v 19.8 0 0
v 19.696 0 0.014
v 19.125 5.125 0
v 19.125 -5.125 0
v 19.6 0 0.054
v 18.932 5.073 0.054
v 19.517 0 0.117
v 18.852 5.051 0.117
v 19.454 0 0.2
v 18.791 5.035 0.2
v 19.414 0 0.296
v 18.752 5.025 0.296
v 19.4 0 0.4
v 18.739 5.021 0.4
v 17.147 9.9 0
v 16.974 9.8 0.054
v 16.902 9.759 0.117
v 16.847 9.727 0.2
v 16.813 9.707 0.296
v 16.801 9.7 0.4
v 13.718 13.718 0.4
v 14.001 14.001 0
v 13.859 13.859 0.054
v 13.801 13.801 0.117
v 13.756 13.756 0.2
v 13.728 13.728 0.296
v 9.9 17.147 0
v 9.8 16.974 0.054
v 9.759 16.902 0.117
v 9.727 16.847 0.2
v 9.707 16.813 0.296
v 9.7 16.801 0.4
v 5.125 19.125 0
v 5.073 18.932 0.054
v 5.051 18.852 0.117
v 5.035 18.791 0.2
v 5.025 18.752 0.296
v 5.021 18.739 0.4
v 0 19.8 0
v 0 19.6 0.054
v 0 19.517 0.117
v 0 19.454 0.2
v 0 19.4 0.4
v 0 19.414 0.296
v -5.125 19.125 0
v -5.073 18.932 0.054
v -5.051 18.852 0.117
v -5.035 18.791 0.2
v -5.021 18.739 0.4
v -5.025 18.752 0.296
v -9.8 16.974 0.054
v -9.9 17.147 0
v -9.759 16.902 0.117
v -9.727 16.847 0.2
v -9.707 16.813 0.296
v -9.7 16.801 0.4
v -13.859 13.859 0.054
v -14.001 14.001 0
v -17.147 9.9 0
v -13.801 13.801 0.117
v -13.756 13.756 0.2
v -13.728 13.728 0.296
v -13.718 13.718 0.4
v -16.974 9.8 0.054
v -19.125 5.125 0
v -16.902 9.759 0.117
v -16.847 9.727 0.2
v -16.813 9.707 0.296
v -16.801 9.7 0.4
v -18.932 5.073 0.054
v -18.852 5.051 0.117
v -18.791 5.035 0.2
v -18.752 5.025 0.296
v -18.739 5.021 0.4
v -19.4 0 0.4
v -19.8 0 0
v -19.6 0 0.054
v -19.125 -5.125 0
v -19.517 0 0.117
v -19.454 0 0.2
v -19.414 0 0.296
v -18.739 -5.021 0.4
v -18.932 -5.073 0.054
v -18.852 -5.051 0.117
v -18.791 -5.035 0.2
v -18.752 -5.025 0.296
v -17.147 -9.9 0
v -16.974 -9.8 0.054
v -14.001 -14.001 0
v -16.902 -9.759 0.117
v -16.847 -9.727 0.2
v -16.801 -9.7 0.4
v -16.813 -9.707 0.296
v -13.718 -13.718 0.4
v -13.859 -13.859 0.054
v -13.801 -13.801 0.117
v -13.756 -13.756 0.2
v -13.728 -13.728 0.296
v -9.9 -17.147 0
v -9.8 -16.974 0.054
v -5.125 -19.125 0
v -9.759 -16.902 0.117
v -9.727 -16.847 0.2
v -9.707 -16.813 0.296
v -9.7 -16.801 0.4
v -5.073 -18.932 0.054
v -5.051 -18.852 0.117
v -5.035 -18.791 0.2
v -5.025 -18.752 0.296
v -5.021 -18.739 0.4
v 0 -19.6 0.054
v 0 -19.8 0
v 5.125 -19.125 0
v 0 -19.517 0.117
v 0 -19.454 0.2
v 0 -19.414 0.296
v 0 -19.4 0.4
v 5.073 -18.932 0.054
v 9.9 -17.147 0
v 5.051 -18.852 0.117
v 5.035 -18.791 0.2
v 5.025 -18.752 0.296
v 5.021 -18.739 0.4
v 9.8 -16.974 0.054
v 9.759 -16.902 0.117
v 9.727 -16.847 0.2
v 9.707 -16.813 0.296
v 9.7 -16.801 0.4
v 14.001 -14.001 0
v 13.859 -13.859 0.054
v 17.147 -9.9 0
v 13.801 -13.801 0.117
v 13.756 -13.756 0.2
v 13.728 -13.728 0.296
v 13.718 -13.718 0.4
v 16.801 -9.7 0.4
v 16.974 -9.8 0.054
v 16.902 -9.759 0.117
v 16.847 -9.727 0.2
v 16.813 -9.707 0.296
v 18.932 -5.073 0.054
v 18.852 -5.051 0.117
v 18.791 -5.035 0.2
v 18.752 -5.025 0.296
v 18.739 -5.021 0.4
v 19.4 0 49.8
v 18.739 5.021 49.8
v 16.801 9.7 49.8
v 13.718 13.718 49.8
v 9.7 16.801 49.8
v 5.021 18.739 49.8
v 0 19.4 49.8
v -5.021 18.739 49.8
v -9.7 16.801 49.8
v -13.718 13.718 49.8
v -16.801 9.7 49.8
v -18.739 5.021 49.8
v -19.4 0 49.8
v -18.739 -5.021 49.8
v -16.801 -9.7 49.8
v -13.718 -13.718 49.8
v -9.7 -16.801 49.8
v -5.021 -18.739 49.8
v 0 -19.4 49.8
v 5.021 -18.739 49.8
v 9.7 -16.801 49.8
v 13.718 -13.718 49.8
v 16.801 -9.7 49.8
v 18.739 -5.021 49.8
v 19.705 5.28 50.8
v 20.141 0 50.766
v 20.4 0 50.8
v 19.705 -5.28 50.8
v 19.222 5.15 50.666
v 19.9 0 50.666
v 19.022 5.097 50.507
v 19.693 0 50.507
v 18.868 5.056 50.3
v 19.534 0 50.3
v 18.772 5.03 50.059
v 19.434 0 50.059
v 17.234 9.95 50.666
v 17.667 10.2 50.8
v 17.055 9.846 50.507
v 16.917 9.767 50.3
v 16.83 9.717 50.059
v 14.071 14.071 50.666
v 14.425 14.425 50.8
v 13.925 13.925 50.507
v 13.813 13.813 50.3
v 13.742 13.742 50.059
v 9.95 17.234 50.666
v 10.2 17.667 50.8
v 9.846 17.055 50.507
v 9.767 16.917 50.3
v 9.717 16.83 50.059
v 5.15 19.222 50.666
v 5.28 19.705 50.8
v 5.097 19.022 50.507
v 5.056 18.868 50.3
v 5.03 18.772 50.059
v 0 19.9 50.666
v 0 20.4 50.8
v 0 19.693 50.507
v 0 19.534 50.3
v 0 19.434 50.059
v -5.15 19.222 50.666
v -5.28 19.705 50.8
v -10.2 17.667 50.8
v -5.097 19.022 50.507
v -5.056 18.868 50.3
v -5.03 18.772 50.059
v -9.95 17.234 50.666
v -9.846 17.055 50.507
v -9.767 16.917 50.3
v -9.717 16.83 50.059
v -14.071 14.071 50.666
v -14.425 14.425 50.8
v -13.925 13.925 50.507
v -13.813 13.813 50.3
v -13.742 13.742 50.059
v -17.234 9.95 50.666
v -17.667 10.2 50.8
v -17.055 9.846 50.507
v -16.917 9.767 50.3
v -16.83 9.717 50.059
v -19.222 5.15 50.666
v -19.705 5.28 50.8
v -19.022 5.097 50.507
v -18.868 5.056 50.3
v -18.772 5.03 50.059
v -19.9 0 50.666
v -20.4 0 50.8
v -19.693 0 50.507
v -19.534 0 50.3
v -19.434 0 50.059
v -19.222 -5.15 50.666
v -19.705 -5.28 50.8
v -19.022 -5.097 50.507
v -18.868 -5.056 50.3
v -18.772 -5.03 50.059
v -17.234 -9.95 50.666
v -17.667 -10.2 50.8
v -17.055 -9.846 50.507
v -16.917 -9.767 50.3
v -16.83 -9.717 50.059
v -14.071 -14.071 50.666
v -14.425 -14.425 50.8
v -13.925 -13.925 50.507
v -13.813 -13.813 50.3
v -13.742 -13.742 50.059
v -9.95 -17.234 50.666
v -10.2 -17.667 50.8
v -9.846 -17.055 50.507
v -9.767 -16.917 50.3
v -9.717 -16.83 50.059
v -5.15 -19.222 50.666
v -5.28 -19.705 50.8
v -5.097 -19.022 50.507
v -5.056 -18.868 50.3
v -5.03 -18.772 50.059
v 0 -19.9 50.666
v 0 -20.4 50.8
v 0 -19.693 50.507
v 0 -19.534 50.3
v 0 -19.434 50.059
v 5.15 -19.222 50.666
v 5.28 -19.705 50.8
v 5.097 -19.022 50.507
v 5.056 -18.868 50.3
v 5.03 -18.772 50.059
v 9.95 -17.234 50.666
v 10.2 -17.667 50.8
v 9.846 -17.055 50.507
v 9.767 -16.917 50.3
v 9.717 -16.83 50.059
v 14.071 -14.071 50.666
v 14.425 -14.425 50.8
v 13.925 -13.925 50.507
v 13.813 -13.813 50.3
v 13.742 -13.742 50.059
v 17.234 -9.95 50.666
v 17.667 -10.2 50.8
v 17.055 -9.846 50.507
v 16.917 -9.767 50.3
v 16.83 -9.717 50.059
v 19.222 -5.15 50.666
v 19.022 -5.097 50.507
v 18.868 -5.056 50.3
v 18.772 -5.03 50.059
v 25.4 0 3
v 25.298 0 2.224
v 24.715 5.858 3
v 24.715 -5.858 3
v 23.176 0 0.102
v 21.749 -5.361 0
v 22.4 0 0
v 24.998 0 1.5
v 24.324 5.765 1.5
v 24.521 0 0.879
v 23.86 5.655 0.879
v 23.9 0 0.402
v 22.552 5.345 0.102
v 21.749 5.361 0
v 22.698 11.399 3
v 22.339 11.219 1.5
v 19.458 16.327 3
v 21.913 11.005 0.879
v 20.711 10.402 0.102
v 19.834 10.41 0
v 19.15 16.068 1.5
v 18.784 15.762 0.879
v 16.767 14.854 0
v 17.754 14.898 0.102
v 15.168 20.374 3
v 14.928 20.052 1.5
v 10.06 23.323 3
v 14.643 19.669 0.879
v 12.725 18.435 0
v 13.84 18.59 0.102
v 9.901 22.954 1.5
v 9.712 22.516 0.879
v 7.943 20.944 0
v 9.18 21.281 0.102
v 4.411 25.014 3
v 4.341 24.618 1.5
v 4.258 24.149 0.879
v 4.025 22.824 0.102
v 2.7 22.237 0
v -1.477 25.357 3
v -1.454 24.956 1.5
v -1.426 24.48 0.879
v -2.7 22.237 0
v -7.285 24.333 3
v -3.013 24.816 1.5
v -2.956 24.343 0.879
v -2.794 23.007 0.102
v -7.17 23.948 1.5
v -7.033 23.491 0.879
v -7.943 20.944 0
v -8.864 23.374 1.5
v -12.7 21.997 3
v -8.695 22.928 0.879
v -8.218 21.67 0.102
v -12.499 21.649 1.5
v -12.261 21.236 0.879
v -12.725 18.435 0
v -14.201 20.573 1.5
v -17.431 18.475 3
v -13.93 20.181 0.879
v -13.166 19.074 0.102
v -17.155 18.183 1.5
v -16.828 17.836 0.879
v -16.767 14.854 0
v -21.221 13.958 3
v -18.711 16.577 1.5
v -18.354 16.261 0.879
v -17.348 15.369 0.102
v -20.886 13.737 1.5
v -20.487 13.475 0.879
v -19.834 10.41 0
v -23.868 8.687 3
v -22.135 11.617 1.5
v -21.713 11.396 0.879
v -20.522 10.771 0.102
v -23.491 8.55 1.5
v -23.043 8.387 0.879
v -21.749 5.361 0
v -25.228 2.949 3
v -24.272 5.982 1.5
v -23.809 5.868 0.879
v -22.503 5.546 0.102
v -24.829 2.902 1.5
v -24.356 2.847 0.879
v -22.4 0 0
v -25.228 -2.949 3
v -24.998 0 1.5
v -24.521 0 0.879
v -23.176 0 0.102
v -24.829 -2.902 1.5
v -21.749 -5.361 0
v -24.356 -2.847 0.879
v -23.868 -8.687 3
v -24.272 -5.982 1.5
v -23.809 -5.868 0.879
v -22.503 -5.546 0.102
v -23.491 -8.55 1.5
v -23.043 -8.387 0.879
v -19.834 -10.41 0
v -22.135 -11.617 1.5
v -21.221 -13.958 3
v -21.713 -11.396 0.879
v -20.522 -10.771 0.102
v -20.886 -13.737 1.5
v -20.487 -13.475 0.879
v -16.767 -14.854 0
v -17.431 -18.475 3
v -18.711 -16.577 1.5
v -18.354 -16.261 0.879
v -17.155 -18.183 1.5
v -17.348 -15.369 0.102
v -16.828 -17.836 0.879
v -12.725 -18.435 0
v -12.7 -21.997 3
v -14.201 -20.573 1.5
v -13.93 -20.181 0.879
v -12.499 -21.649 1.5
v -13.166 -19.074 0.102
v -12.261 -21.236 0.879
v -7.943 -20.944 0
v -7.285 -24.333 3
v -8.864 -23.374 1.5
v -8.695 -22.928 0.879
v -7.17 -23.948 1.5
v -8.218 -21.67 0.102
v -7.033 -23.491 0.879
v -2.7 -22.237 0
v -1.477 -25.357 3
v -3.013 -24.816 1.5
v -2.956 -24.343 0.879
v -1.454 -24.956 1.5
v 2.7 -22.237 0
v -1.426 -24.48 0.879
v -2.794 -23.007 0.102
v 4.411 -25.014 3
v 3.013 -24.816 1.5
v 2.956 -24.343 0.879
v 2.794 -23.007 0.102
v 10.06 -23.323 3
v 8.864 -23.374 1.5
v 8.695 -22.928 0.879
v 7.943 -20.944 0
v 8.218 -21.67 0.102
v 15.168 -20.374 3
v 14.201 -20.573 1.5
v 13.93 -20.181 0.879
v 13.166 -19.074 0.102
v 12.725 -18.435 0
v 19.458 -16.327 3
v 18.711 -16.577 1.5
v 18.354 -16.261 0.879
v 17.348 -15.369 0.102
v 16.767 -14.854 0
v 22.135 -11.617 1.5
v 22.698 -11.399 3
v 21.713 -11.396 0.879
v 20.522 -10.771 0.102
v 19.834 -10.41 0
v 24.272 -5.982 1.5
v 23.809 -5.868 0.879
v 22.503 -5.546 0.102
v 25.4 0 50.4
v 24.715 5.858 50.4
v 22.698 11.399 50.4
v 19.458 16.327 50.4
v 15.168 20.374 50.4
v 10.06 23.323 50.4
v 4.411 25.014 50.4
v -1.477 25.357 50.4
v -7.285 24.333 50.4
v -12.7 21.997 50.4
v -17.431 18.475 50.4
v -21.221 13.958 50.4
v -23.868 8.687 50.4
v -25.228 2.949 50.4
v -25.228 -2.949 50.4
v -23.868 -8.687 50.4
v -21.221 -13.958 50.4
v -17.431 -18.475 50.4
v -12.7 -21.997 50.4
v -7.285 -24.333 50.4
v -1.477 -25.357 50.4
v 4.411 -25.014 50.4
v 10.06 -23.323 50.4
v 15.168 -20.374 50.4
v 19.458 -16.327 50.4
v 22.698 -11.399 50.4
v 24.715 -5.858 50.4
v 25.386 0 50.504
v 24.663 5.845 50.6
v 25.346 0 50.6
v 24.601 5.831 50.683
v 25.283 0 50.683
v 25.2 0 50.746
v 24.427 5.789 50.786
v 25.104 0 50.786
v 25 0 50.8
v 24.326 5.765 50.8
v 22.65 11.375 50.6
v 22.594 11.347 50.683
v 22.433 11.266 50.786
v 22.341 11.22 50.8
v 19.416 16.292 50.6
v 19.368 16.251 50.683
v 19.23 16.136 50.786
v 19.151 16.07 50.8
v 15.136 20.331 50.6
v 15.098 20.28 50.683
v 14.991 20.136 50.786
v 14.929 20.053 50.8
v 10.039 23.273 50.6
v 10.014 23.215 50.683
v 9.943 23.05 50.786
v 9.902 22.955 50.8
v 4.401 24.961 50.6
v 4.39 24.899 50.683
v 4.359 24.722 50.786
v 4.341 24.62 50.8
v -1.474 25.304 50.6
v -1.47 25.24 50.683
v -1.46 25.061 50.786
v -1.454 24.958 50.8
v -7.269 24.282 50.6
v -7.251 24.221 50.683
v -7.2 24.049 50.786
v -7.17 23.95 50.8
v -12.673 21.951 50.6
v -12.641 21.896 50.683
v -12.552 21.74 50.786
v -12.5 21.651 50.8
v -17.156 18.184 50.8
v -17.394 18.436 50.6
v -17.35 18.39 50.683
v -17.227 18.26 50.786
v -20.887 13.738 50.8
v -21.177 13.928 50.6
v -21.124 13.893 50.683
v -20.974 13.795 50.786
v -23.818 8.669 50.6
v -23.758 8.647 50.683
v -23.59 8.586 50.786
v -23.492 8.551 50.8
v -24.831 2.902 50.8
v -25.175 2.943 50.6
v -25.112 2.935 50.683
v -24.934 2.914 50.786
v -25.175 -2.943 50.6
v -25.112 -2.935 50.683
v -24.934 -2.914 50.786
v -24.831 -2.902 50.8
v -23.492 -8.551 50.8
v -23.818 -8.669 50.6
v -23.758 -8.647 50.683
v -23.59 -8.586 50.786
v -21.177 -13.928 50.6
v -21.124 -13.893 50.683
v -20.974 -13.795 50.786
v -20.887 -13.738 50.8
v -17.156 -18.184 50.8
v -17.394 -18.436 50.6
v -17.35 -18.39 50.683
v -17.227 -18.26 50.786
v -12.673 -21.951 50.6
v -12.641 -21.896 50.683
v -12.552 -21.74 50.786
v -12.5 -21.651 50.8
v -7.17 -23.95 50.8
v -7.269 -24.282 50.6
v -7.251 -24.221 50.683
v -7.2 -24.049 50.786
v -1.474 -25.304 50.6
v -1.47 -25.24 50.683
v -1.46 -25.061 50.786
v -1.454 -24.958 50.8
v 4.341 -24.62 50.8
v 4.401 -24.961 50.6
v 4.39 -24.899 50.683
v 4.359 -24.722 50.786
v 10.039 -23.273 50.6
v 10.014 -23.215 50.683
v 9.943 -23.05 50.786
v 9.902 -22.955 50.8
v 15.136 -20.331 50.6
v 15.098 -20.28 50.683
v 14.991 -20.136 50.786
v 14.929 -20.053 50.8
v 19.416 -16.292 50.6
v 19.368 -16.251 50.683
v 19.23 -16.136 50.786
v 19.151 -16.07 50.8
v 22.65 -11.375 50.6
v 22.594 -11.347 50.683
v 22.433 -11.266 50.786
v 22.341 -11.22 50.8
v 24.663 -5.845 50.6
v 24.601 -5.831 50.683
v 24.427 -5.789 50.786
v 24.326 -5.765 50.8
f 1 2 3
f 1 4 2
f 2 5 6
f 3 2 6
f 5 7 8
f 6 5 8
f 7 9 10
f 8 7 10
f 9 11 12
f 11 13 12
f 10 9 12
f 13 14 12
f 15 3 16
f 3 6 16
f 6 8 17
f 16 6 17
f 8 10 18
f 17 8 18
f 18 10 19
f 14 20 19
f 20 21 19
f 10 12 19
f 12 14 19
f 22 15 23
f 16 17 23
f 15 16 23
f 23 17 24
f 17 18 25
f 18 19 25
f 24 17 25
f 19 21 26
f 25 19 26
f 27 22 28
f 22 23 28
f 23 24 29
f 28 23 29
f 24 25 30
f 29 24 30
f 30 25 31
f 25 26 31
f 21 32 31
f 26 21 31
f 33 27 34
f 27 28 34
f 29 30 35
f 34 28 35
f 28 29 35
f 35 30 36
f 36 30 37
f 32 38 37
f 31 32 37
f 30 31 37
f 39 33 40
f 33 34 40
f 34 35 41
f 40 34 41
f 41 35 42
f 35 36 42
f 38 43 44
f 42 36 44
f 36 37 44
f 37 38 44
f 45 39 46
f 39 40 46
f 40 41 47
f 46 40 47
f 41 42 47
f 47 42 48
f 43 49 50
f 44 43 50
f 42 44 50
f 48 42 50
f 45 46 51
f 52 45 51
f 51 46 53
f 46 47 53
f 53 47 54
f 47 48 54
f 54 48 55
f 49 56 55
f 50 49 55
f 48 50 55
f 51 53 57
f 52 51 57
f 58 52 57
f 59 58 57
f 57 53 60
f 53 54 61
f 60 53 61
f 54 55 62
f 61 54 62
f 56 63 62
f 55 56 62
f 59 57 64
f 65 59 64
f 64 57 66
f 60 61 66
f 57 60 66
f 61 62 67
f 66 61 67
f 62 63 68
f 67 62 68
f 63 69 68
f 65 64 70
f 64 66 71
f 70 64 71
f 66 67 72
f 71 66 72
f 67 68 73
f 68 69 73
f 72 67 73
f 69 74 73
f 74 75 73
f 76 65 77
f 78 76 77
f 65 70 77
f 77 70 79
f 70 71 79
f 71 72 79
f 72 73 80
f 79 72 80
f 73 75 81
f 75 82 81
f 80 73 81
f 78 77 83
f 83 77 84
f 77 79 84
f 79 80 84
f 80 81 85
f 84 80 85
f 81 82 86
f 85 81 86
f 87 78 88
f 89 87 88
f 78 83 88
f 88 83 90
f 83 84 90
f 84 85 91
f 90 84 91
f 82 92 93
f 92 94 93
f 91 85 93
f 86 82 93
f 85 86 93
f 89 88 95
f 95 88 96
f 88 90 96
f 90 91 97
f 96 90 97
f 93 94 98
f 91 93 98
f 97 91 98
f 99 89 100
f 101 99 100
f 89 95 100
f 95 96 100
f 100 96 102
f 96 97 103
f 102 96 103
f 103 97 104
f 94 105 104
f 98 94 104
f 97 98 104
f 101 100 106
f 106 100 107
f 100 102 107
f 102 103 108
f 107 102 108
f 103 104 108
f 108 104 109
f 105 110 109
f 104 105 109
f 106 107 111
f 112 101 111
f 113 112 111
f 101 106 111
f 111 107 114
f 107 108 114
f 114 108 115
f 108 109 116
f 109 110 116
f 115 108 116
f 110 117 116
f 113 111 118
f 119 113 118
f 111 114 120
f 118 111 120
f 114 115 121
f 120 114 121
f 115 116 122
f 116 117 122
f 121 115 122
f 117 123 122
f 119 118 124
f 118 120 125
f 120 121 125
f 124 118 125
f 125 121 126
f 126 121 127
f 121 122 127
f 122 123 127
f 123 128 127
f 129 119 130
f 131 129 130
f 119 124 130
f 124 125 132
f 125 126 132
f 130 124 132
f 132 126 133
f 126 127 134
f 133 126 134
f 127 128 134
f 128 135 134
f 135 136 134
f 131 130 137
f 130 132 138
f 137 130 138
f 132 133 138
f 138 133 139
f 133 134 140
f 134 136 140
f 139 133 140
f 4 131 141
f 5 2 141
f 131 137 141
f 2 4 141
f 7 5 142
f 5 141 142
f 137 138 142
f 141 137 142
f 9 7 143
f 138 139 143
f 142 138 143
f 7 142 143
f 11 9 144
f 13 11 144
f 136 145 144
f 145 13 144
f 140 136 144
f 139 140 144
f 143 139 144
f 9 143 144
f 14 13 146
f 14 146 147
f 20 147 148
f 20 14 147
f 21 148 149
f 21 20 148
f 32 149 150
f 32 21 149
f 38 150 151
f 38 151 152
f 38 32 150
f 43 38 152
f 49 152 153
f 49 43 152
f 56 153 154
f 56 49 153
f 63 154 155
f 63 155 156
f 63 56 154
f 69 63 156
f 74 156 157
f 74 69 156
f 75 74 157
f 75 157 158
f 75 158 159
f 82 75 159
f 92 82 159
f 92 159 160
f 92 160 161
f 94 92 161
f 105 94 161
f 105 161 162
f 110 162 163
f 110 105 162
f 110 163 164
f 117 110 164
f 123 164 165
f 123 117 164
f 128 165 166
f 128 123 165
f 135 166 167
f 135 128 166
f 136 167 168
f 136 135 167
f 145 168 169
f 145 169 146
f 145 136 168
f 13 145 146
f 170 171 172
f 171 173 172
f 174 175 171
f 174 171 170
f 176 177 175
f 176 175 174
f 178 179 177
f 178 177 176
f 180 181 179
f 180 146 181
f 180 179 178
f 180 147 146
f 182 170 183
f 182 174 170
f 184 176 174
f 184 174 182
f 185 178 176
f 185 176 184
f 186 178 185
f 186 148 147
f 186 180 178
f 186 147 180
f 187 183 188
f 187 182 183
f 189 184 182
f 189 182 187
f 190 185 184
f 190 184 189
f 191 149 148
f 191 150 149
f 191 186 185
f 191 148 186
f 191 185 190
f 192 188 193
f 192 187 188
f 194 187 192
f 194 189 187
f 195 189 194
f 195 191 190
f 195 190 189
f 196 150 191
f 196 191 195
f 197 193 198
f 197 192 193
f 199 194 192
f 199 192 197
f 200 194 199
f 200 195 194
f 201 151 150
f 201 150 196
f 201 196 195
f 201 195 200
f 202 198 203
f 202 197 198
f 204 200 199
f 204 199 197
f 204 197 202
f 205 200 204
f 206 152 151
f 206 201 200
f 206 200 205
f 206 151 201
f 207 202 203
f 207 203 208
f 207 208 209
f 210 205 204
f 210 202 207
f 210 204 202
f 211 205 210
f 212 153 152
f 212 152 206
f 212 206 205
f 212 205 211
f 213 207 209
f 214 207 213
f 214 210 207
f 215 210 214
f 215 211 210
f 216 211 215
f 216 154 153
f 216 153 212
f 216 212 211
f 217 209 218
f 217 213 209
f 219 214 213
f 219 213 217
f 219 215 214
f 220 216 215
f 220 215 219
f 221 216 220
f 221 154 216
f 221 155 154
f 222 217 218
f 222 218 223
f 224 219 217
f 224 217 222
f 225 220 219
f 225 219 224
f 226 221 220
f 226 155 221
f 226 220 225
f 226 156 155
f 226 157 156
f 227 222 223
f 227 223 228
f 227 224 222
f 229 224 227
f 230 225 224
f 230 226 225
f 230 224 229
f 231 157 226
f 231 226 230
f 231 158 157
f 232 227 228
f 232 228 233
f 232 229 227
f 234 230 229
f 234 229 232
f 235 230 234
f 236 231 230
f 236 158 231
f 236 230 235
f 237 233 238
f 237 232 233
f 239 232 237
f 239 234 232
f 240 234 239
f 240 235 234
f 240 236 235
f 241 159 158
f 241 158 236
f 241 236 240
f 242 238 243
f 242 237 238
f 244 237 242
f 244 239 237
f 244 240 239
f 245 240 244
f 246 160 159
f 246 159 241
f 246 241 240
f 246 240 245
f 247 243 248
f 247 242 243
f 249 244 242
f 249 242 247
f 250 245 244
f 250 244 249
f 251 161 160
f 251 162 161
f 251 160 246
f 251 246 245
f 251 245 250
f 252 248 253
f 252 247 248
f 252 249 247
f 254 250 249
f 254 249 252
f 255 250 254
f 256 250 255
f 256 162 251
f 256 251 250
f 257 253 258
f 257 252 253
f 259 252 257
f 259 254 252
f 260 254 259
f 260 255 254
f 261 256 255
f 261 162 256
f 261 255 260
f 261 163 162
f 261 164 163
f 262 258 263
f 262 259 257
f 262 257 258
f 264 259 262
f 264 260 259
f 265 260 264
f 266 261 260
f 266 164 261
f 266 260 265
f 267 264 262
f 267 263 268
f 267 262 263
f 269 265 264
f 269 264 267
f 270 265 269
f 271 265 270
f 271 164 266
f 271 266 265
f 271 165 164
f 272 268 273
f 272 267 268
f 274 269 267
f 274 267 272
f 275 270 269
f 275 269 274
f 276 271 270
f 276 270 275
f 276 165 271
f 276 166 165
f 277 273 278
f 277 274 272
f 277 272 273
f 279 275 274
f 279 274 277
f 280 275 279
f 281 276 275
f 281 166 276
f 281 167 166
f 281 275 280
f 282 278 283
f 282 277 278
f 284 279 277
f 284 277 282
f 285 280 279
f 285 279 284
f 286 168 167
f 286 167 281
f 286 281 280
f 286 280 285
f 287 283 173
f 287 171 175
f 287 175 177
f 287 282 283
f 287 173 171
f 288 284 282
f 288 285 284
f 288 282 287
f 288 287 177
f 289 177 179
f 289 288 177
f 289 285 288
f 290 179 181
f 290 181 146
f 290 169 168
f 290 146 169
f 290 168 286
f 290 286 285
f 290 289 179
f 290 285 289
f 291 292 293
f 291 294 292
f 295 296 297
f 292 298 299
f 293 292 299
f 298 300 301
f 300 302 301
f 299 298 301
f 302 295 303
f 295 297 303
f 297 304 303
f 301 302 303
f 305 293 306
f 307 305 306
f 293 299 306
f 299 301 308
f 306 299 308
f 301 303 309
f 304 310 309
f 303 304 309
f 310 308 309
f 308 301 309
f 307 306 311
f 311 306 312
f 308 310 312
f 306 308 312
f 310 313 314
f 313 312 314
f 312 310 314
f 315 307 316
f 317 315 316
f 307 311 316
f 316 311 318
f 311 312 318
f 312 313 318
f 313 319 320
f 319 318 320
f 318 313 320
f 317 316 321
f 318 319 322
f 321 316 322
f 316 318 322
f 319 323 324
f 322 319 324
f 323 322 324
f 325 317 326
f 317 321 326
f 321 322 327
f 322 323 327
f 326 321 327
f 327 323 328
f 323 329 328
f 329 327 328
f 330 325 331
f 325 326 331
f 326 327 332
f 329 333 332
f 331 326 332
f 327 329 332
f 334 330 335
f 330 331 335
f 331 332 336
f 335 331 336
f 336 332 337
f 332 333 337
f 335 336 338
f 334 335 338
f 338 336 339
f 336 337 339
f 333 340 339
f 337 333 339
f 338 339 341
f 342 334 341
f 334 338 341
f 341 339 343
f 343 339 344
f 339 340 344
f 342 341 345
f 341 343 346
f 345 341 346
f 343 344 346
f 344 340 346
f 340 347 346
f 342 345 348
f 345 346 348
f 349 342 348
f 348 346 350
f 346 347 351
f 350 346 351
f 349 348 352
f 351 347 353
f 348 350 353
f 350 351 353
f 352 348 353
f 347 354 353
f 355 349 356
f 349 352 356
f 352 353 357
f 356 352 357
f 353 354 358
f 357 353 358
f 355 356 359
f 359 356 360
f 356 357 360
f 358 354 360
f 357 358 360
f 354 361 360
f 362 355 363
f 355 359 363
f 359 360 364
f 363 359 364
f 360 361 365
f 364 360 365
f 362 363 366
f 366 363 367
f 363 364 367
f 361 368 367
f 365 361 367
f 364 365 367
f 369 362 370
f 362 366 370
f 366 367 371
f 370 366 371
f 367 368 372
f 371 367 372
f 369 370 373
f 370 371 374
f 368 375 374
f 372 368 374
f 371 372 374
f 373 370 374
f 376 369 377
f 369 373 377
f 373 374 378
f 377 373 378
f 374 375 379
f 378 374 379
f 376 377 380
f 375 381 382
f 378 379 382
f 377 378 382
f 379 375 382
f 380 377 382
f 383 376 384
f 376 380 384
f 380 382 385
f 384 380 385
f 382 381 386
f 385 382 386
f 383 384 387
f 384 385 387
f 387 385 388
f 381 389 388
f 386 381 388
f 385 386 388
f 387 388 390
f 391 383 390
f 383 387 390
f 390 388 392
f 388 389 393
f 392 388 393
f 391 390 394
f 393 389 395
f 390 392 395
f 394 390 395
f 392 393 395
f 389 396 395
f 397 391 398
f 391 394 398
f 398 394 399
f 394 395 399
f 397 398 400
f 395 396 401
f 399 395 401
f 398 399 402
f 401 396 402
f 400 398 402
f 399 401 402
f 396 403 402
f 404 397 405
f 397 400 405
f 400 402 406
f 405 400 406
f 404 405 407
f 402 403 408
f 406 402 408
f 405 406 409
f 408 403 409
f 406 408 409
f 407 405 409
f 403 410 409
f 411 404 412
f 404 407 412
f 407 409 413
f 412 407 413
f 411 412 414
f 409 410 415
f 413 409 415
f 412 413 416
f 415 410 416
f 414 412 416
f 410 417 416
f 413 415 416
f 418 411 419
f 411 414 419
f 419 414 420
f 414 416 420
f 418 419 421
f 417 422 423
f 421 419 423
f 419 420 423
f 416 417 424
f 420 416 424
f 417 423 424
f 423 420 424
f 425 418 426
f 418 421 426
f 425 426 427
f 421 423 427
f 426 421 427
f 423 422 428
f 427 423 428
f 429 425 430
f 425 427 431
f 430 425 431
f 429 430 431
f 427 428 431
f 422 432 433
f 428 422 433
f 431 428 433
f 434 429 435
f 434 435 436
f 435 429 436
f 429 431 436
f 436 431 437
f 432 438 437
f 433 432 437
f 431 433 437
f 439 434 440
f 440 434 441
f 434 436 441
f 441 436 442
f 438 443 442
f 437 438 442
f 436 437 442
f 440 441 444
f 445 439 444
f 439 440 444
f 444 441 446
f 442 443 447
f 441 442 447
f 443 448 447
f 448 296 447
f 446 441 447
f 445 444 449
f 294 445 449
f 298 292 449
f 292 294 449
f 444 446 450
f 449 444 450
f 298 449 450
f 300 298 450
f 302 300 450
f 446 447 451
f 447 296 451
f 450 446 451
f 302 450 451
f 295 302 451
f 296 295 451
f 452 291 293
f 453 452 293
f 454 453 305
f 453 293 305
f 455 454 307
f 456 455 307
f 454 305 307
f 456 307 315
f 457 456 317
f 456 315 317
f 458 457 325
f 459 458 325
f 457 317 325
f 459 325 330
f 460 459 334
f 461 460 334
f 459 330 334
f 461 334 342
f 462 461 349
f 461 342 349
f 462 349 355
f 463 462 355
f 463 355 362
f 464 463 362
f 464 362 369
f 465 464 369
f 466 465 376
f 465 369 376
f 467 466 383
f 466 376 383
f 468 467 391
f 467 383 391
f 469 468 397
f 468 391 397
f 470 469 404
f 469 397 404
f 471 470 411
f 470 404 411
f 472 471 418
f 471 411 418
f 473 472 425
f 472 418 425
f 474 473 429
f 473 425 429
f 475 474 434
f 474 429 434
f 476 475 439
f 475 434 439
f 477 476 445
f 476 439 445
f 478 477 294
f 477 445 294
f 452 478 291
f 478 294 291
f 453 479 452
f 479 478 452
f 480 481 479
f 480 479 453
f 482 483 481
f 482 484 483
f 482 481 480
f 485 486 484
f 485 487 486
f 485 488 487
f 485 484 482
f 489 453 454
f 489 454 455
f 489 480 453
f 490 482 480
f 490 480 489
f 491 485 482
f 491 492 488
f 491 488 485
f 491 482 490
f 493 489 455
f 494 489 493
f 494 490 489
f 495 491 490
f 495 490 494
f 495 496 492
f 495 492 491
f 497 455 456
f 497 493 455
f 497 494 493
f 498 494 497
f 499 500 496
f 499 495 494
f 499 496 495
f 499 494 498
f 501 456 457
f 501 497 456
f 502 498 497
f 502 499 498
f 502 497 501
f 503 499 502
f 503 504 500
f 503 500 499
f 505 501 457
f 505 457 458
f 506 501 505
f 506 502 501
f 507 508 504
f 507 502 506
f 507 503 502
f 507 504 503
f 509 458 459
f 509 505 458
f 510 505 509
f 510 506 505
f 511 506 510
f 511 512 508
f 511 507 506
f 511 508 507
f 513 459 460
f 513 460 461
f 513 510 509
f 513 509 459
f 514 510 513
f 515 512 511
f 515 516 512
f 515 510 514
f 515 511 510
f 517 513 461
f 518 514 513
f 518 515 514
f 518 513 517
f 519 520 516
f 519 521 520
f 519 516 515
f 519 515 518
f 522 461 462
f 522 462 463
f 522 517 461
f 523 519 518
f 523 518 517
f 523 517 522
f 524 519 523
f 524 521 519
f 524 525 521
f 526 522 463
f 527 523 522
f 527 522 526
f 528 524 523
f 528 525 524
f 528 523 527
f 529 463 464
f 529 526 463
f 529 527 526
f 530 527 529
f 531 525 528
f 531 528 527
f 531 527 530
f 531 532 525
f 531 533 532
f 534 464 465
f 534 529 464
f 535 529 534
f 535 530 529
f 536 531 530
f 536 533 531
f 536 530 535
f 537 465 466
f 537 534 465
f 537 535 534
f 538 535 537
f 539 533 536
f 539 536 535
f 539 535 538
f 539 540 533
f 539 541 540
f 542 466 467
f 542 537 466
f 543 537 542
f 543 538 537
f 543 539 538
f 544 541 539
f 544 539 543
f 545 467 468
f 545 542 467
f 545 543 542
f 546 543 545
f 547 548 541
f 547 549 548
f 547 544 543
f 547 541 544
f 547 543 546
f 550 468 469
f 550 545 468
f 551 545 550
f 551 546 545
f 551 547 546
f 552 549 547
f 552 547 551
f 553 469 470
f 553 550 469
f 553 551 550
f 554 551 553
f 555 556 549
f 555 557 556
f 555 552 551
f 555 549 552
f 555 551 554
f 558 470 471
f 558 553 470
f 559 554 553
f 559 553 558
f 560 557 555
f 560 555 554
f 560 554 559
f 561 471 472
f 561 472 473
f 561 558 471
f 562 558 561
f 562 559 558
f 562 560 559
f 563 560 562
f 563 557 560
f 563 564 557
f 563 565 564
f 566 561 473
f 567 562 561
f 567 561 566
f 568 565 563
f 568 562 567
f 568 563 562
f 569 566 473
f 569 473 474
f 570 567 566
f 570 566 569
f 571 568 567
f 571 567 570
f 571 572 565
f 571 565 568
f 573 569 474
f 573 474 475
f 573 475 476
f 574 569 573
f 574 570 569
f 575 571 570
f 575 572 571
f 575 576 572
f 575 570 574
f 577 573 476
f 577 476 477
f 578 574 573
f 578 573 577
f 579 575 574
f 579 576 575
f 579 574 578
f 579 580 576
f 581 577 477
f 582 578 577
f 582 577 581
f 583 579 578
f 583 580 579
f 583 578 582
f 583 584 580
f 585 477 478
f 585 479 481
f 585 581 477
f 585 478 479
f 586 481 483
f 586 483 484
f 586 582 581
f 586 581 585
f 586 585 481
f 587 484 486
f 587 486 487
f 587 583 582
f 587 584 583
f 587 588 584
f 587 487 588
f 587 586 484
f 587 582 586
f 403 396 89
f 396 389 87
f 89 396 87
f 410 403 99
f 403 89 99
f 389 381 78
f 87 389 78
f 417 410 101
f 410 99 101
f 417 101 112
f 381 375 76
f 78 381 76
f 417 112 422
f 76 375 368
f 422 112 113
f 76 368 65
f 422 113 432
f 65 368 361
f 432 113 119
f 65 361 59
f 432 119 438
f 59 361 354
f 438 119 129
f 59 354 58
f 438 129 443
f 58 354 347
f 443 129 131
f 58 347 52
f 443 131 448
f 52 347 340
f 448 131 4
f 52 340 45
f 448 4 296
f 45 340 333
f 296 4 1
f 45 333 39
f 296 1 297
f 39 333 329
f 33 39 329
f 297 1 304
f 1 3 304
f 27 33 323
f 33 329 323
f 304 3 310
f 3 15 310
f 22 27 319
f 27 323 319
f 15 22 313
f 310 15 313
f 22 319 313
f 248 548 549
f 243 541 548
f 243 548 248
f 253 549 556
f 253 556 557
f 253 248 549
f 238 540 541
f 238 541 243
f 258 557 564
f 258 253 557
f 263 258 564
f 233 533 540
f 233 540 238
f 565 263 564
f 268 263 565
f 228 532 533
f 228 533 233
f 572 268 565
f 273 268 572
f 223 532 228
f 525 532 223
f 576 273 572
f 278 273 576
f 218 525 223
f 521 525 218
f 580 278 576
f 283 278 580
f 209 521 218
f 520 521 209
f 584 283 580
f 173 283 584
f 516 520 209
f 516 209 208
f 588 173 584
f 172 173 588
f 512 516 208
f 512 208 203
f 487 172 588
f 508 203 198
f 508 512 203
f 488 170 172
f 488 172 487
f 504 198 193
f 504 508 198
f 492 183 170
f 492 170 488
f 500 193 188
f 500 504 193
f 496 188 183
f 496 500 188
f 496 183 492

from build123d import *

# Parameters (mm, degrees)
F0_R     = 25.4
F0_R_2   = 19.4
F1_DEPTH = 50.8
F2_R     = 3
F3_R     = 0.4
F4_R     = 1


with BuildPart() as f1:
    # F0 (on Top) → F1 (new body)
    with BuildSketch(Plane.XY):
        Circle(F0_R)
        Circle(F0_R_2, mode=Mode.SUBTRACT)
    extrude(amount=F1_DEPTH)

    # F2
    f2_edges = [f1.edges().sort_by_distance(p)[0] for p in [
        (-25.4, 0, 0),
    ]]
    fillet(f2_edges, radius=F2_R)

    # F3
    f3_edges = [f1.edges().sort_by_distance(p)[0] for p in [
        (-25.4, 0, 50.8),
        (-19.4, 0, 0),
    ]]
    fillet(f3_edges, radius=F3_R)

    # F4
    f4_edges = [f1.edges().sort_by_distance(p)[0] for p in [
        (-19.4, 0, 50.8),
    ]]
    fillet(f4_edges, radius=F4_R)


solid = f1.part
